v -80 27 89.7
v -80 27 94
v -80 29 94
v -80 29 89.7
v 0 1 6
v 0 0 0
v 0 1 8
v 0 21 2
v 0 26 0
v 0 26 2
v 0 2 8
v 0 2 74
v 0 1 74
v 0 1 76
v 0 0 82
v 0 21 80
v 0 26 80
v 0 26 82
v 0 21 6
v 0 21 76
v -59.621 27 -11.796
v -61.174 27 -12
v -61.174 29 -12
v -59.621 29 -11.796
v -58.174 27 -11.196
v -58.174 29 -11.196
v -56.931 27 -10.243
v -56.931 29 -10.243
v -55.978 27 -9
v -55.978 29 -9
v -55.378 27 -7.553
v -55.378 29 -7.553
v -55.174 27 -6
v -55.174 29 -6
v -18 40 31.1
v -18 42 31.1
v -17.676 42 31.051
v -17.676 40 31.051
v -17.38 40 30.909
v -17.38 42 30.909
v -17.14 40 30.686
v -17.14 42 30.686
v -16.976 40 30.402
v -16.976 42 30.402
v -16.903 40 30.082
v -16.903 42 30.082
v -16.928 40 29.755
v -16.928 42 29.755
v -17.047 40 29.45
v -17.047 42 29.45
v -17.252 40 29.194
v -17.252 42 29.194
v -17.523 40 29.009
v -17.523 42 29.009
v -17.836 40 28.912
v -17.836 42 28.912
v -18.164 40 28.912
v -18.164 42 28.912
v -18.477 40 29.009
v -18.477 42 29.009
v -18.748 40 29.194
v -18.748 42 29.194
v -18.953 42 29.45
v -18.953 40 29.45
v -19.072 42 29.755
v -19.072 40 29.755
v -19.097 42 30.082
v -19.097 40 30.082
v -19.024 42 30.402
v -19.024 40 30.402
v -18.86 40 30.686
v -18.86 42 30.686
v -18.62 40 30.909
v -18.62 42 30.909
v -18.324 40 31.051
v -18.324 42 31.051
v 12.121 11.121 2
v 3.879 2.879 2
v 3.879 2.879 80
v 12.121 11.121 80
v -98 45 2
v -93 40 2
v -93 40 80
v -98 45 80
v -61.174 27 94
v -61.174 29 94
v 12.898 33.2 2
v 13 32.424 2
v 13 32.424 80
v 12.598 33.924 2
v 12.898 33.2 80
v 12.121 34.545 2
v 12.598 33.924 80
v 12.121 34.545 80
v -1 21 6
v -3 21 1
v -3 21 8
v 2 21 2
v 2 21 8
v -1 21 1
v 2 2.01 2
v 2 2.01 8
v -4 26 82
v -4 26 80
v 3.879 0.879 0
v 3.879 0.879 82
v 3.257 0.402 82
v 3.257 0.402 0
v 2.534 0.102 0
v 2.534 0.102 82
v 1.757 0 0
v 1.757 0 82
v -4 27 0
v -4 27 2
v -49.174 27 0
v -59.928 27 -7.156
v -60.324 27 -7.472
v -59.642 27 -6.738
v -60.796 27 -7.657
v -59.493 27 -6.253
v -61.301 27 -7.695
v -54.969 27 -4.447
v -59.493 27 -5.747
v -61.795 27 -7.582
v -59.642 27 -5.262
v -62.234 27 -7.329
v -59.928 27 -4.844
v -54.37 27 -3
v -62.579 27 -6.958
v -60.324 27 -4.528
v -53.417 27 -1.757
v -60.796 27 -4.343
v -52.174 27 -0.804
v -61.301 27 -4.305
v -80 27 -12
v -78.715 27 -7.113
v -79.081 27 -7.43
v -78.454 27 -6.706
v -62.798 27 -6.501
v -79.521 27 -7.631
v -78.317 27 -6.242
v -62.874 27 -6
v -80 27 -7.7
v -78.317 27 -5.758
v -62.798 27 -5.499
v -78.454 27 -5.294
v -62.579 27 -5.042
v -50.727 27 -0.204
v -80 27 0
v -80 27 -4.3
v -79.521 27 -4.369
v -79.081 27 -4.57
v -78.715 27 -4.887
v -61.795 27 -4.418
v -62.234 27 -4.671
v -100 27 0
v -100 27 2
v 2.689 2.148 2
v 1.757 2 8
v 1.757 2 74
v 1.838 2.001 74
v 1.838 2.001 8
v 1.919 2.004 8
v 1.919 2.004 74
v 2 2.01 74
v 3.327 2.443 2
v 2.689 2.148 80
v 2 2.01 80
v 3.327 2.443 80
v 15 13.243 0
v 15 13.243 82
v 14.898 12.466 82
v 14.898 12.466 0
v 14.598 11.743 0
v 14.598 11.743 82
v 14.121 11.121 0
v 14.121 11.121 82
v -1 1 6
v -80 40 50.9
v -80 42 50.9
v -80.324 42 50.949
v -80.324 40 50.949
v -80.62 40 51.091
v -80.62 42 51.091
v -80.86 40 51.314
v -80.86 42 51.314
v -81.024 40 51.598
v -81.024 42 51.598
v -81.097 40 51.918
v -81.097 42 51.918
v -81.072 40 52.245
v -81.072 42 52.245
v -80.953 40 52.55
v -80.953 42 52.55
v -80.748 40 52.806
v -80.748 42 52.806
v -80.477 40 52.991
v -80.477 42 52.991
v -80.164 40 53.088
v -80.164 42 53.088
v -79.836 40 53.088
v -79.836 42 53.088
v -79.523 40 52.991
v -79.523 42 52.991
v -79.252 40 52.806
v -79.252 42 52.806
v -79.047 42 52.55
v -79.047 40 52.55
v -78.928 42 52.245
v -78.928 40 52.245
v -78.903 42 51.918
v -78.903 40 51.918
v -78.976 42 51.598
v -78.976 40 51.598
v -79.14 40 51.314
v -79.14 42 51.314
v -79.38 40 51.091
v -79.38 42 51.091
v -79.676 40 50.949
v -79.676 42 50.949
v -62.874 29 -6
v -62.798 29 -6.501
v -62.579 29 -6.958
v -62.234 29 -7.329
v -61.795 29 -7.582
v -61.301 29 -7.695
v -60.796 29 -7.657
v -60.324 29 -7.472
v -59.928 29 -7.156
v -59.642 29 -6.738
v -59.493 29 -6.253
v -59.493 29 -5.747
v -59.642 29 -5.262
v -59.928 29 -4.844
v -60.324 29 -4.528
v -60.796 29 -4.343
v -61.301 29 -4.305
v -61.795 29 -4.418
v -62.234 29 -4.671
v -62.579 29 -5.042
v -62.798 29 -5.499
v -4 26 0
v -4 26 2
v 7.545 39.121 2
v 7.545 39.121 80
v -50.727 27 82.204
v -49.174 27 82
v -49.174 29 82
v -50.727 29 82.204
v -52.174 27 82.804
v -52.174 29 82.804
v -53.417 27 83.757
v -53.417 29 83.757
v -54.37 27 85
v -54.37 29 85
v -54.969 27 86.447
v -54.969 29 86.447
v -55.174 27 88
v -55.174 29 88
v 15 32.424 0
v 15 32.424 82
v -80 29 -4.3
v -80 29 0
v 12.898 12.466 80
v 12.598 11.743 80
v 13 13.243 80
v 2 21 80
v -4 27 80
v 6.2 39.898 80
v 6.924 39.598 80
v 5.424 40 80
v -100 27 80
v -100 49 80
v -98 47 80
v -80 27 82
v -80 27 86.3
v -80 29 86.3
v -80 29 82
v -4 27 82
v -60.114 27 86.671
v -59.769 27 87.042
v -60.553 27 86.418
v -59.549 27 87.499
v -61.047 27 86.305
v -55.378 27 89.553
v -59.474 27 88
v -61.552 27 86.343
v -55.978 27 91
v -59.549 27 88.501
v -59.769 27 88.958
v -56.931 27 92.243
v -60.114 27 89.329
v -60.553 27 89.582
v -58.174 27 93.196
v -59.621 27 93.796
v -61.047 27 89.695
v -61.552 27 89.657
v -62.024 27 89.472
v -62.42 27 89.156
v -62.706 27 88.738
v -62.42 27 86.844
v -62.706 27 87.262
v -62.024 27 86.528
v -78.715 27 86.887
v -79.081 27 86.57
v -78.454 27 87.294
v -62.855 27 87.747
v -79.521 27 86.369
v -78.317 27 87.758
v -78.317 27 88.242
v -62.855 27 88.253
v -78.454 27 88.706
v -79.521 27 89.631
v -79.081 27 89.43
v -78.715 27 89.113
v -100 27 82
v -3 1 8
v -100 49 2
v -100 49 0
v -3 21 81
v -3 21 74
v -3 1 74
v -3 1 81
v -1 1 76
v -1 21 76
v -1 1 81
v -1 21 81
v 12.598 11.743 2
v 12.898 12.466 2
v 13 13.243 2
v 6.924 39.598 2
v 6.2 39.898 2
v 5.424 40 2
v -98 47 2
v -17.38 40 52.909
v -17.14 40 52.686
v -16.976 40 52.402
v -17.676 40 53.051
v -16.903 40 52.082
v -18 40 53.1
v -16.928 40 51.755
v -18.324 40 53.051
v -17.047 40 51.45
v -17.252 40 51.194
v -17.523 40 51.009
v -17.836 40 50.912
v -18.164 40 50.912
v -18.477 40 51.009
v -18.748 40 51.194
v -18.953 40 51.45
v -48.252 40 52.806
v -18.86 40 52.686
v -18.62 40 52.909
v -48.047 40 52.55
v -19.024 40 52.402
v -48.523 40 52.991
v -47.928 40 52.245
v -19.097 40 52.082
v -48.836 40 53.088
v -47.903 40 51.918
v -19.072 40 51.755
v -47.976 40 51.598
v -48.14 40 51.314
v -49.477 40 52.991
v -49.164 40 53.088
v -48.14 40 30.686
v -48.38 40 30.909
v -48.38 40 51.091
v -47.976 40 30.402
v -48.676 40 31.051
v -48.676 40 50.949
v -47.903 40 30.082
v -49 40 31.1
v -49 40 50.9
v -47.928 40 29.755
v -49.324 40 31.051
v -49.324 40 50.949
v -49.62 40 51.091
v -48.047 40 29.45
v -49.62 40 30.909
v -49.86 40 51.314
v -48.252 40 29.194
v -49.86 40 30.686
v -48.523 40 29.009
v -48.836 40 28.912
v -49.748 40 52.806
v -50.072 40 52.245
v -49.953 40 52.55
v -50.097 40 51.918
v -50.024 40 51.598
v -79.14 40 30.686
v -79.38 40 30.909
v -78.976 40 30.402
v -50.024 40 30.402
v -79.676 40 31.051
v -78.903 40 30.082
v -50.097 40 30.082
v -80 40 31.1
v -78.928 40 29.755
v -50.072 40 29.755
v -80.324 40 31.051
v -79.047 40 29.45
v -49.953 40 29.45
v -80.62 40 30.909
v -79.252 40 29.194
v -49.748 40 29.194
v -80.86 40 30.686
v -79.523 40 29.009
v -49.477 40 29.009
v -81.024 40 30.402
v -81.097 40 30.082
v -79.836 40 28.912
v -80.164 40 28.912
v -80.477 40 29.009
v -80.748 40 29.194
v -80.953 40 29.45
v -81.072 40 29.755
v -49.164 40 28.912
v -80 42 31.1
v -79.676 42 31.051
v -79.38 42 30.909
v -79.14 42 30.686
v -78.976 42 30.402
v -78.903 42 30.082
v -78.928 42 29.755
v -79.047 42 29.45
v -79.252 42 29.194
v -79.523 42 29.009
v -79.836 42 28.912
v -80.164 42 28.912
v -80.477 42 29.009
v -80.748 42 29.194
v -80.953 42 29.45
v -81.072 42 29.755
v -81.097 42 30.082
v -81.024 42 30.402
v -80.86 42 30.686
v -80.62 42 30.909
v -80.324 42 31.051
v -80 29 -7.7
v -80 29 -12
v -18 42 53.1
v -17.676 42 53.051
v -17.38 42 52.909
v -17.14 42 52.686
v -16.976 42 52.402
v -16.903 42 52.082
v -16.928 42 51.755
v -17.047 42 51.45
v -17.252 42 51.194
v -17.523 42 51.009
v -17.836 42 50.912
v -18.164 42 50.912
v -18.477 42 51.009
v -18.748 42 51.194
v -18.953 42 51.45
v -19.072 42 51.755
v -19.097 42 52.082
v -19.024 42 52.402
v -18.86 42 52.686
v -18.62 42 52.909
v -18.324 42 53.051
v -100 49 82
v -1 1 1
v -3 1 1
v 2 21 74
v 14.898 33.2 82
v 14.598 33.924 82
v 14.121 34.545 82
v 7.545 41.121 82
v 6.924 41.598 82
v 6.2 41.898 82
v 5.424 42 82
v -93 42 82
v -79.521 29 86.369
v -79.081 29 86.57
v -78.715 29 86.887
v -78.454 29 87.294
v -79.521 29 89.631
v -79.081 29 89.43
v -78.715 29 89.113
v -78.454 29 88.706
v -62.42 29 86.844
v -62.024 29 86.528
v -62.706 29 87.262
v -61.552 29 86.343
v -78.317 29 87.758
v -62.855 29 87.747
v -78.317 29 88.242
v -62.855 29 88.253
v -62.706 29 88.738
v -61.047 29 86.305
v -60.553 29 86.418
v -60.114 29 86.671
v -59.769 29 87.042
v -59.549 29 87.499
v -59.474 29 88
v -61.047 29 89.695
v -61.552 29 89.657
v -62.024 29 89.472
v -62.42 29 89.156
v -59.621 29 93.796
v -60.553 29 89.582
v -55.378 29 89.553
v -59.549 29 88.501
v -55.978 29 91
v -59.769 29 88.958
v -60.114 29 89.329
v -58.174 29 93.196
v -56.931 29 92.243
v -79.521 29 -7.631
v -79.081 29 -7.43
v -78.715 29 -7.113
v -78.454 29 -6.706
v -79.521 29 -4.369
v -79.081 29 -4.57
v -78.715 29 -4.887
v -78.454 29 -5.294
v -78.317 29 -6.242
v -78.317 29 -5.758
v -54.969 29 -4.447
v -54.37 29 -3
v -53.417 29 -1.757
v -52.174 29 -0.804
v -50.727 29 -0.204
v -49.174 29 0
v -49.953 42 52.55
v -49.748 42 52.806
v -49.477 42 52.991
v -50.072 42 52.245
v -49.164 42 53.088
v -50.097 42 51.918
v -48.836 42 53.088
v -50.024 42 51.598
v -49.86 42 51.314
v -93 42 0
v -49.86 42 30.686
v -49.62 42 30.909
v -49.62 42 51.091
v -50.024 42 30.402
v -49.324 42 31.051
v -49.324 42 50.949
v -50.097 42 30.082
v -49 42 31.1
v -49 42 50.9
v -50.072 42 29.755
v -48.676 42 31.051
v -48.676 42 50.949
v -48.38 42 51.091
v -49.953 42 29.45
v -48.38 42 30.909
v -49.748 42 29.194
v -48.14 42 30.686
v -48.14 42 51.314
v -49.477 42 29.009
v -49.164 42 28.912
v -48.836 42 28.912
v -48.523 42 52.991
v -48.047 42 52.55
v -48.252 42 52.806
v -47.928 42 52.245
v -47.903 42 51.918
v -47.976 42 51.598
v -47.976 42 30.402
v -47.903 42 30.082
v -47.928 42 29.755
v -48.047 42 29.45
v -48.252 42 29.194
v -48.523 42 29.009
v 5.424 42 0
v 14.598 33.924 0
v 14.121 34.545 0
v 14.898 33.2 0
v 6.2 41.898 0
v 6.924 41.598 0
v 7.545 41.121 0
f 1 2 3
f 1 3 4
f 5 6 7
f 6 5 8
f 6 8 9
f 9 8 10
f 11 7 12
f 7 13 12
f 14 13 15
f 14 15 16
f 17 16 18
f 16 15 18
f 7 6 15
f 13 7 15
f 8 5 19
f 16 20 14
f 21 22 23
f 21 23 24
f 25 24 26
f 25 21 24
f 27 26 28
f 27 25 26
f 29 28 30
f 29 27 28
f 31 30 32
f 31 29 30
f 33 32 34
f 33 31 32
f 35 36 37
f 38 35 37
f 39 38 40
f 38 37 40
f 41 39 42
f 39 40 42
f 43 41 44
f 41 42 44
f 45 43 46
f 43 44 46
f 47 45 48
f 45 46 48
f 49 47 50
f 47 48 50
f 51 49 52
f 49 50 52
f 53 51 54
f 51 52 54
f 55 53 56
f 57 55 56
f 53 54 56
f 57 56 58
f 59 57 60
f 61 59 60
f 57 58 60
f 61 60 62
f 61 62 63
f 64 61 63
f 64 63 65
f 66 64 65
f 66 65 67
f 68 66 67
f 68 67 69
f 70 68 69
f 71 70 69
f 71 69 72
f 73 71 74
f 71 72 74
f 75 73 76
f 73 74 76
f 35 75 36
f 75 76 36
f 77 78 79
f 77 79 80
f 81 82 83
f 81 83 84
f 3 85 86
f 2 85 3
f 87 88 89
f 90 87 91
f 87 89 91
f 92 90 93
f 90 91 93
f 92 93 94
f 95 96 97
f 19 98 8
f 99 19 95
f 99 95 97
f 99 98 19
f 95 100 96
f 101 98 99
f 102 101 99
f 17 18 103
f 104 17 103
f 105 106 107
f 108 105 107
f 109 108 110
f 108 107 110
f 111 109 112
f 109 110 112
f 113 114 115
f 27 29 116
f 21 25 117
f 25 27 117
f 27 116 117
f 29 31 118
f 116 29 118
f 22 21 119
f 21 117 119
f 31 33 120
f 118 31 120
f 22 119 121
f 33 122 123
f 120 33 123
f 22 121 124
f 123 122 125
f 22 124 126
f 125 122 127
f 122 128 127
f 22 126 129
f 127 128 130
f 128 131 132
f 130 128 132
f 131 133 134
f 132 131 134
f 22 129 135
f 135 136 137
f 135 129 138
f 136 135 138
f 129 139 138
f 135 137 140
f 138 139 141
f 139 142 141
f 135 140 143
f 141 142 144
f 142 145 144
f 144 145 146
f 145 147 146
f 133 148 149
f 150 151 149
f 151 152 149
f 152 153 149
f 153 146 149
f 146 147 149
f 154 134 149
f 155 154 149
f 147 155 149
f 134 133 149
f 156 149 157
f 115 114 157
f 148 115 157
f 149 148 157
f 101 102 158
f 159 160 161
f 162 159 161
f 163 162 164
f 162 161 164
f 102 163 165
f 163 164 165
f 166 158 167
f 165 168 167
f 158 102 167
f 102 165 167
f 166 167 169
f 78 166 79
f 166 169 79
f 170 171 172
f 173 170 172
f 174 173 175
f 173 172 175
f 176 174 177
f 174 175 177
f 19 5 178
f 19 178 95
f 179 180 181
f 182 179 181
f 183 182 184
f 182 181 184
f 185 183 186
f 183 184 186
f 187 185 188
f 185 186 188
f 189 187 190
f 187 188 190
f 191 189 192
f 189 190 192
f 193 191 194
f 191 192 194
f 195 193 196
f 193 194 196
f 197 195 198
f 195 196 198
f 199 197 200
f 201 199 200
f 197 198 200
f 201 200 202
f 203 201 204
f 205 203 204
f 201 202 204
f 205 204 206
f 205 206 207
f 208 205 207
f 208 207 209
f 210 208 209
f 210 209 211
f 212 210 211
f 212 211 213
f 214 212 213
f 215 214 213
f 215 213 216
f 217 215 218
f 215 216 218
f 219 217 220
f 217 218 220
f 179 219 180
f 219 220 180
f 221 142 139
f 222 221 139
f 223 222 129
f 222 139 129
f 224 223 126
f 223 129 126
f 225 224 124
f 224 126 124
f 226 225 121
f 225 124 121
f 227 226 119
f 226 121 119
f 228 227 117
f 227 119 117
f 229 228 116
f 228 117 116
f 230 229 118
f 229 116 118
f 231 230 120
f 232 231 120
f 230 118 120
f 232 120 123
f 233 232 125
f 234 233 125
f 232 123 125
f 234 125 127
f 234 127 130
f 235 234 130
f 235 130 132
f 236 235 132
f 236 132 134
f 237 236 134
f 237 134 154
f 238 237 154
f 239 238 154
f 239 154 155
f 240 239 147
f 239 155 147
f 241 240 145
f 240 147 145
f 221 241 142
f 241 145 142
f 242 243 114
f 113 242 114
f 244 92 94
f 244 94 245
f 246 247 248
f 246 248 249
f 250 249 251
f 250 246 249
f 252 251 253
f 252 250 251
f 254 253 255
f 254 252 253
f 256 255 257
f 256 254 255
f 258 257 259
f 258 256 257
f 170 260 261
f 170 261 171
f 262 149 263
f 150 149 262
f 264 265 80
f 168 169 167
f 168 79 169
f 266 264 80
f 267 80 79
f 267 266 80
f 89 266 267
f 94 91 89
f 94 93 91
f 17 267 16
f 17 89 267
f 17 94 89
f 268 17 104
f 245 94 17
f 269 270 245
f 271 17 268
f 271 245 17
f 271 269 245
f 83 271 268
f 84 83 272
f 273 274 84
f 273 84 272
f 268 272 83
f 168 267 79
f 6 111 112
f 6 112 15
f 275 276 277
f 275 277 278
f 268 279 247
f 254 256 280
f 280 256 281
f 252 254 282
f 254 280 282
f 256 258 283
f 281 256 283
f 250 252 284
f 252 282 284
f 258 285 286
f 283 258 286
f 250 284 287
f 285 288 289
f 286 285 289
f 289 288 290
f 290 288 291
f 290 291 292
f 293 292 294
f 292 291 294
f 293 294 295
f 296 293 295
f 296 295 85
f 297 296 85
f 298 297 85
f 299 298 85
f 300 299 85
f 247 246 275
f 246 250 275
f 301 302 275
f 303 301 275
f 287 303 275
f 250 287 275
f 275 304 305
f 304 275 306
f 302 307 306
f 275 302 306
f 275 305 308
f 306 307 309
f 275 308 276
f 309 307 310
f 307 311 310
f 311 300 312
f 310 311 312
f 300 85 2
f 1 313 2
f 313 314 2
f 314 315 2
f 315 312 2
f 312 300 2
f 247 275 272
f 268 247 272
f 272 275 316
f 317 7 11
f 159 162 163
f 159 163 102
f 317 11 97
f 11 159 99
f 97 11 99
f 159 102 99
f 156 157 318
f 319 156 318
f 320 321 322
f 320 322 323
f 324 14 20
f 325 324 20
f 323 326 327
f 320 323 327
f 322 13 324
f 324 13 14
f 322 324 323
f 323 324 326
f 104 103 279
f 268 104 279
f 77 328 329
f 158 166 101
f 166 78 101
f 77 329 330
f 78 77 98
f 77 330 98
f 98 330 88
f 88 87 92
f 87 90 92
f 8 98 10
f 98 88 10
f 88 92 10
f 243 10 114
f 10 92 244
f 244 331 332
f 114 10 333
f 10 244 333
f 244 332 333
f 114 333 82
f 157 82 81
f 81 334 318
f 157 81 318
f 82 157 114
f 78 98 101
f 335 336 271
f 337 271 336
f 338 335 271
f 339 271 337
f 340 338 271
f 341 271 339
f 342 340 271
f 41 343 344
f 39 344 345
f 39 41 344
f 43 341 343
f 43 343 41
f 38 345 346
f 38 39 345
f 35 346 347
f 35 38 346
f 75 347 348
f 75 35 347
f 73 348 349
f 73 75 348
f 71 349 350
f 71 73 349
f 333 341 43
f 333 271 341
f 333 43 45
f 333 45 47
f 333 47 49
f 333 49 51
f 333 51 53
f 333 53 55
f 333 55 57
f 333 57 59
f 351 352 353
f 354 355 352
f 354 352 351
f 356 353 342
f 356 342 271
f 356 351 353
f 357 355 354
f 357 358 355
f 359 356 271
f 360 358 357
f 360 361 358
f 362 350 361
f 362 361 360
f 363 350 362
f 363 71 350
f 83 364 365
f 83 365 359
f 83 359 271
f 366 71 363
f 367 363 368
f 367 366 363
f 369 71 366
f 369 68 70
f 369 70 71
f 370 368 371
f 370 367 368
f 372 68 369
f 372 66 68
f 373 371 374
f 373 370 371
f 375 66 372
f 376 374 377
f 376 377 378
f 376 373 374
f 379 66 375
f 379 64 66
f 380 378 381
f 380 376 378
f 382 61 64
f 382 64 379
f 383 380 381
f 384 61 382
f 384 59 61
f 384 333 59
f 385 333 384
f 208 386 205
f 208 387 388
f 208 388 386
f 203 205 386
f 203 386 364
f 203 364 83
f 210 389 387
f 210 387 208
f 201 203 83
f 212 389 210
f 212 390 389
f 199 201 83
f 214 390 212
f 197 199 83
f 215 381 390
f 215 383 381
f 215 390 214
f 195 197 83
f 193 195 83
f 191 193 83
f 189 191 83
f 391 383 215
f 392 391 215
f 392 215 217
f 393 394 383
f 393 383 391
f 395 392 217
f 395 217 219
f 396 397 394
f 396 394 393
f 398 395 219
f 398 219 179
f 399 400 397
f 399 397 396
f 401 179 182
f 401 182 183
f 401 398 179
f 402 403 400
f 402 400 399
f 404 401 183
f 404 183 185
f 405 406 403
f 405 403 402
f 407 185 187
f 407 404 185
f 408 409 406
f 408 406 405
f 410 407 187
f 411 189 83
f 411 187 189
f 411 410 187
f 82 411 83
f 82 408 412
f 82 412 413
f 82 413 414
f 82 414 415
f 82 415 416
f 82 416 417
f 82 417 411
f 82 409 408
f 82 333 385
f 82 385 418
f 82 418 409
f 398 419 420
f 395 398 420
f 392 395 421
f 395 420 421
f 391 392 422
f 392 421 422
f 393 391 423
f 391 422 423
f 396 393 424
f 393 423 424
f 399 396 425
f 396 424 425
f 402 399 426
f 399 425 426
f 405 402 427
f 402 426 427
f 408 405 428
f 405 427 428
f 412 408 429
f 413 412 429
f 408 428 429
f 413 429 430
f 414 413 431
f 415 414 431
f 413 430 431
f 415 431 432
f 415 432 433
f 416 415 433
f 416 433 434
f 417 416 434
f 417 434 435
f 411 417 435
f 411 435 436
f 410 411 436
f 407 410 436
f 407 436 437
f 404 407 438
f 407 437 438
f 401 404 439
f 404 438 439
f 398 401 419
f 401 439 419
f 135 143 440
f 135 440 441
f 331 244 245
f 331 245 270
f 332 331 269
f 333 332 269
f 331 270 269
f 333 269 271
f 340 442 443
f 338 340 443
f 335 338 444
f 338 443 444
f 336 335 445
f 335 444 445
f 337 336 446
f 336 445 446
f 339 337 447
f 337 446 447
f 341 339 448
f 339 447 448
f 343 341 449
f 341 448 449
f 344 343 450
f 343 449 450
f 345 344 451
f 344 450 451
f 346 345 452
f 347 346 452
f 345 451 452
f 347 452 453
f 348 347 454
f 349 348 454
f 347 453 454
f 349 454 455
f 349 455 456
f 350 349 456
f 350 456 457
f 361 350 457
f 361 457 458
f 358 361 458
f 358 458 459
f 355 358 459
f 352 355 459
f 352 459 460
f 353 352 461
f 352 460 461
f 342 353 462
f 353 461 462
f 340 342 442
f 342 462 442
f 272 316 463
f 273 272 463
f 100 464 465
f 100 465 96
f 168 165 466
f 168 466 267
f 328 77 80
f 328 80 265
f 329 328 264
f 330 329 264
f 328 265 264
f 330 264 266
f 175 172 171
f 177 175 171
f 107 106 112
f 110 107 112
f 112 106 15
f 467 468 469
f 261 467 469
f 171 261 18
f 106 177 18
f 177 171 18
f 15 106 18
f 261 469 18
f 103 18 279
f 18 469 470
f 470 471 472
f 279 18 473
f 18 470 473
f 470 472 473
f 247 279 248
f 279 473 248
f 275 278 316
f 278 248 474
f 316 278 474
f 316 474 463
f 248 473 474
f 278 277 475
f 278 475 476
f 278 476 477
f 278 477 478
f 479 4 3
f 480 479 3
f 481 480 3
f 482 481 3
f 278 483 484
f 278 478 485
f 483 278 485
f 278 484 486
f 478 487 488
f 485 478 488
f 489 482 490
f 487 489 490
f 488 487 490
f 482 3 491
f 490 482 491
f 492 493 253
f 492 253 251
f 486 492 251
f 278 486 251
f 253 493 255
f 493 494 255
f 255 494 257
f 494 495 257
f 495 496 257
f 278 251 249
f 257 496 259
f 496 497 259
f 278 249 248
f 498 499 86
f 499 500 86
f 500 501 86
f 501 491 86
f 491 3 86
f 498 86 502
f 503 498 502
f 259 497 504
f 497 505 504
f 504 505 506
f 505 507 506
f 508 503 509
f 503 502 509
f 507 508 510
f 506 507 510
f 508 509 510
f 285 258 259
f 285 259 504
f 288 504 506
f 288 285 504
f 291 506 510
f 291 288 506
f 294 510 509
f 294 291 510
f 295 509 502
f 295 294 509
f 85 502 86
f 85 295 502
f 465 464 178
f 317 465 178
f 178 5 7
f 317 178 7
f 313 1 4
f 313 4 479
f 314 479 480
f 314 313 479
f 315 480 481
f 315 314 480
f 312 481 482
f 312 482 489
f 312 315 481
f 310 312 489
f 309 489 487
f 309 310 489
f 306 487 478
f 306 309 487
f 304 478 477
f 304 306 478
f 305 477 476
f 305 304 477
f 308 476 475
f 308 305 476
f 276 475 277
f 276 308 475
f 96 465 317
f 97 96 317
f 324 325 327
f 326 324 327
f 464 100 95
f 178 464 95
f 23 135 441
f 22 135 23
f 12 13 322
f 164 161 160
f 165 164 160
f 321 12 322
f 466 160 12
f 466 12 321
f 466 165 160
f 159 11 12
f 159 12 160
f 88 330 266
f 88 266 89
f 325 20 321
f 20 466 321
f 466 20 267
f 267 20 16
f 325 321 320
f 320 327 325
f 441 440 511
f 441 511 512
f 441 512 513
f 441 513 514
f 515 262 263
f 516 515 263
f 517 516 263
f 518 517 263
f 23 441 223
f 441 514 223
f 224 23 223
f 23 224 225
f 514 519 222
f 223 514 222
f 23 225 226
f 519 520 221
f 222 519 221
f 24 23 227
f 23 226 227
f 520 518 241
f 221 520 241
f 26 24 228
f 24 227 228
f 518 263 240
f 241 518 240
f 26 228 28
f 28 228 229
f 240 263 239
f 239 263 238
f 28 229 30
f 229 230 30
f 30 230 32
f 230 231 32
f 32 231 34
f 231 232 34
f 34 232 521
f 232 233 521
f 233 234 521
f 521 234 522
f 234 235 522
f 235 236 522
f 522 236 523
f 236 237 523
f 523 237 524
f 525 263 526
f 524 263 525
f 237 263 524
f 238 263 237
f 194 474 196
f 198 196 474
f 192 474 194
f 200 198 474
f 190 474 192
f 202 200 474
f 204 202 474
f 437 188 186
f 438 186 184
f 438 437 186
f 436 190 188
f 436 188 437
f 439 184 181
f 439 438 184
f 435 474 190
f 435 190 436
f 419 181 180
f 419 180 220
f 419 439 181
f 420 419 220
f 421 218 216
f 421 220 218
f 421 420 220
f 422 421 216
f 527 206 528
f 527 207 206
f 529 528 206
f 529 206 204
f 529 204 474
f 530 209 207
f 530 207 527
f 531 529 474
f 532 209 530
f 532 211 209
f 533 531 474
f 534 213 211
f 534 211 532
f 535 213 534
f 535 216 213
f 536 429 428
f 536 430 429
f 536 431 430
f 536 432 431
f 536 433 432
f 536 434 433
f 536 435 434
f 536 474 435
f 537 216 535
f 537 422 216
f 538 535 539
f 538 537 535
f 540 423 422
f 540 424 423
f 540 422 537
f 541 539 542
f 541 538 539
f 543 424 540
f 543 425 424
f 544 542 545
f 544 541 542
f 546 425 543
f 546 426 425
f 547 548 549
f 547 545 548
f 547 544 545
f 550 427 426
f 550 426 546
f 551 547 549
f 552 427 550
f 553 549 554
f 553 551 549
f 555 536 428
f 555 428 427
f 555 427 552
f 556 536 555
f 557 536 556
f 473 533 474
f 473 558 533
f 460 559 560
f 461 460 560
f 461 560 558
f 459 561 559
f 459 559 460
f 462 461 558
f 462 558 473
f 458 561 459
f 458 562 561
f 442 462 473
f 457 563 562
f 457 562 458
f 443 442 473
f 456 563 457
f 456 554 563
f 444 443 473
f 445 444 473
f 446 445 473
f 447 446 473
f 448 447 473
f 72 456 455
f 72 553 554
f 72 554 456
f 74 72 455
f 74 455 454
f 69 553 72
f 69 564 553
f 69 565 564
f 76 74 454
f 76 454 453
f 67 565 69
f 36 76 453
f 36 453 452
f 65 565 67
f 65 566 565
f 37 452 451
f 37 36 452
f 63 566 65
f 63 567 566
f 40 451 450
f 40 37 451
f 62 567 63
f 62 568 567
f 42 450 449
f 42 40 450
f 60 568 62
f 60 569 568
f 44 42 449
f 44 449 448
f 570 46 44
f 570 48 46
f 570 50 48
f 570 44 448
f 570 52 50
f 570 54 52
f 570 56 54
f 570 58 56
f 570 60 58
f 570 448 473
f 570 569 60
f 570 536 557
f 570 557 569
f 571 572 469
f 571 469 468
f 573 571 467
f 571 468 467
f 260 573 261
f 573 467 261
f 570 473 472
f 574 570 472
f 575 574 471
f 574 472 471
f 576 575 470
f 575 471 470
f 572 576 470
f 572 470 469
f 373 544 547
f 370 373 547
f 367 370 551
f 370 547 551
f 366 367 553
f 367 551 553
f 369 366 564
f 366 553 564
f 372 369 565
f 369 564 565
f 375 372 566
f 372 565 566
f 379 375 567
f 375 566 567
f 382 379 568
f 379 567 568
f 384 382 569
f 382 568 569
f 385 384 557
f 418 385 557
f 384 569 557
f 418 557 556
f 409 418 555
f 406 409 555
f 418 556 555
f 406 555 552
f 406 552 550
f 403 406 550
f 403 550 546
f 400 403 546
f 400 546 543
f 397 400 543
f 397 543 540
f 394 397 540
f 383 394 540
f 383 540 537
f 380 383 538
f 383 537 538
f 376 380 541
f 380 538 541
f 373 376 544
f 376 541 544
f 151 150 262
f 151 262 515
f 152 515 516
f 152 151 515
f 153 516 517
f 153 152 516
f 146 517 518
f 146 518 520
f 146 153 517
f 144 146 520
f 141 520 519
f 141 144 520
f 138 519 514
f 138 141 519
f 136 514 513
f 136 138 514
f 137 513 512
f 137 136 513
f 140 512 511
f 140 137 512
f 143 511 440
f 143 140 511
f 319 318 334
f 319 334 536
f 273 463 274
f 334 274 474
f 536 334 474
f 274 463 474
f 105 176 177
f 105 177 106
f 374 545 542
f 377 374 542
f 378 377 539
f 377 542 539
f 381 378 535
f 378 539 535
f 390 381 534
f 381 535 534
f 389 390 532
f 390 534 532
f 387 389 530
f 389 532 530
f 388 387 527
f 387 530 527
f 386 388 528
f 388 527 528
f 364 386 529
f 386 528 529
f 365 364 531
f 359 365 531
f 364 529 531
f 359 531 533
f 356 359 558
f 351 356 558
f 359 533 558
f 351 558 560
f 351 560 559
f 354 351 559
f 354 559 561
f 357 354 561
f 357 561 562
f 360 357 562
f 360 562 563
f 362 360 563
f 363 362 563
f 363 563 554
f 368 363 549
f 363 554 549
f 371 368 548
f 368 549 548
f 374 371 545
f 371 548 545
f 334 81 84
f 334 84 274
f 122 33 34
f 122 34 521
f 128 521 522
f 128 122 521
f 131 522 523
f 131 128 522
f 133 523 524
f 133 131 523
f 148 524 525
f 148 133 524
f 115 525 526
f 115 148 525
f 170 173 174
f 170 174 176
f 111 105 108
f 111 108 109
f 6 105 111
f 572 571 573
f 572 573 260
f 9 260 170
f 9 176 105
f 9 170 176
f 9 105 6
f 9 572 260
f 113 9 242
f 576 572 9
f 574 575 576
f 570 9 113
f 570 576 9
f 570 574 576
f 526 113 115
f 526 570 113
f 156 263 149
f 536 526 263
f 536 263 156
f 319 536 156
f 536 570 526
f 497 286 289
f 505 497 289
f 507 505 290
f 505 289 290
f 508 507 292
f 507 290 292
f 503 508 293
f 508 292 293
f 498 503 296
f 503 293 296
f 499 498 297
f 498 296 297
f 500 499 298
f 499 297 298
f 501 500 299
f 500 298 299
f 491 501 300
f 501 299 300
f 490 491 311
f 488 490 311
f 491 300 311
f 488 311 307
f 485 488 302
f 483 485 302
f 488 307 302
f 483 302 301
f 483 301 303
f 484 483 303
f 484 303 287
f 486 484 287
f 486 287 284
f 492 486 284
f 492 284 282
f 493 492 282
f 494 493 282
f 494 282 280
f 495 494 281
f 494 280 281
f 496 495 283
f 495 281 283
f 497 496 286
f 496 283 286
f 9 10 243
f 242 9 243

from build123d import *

# Parameters (mm, degrees)
EXTRUDE_1_DEPTH     = 82
FILLET_1_R          = 3
EXTRUDE_START       = -2
EXTRUDE_2_DEPTH     = 2
EXTRUDE_START_2     = -82
EXTRUDE_3_DEPTH     = 2
SKETCH_3_W          = 7
SKETCH_3_H          = 20
EXTRUDE_4_DEPTH     = 2
SKETCH_4_W          = 2
SKETCH_4_H          = 20
EXTRUDE_5_DEPTH     = 1
SKETCH_5_W          = 7
SKETCH_5_H          = 20
EXTRUDE_6_DEPTH     = 2
SKETCH_6_R          = 1.7
EXTRUDE_7_DEPTH     = 2
SKETCH_7_R          = 1.1
CUT_EXTRUDE_1_DEPTH = 2


with BuildPart() as part:
    # 草图1 → 凸台-拉伸1 (new body)
    with BuildSketch(Plane.XY):
        Polygon((0, 2), (3, 2), (13, 12), (13, 33.666666667), (6.666666667, 40), (-93, 40), (-98, 45), (-98, 47), (-93, 42), (6.666666667, 42), (15, 33.666666667), (15, 12), (3, 0), (0, 0), align=None)
    extrude(amount=EXTRUDE_1_DEPTH)

    # 圆角1
    fillet_1_edges = [part.edges().sort_by_distance(p)[0] for p in [
        (3, 2, 41),
        (13, 12, 41),
        (13, 33.666666667, 41),
        (6.666666667, 40, 41),
        (6.666666667, 42, 41),
        (15, 33.666666667, 41),
        (15, 12, 41),
        (3, 0, 41),
    ]]
    fillet(fillet_1_edges, radius=FILLET_1_R)

    # 草图2 → 凸台-拉伸2 (add)
    with BuildSketch(Plane(origin=(0, 0, 0), x_dir=(-1, 0, 0), z_dir=(0, 0, -1)).offset(EXTRUDE_START)):
        with BuildLine():
            Line((100, 27), (100, 49))
            Line((100, 49), (93, 42))
            Line((93, 42), (-5.42402598, 42))
            ThreePointArc((-5.42402598, 42), (-6.572076277, 41.771638598), (-7.545346323, 41.121320344))
            Line((-7.545346323, 41.121320344), (-14.121320344, 34.545346323))
            ThreePointArc((-14.121320344, 34.545346323), (-14.771638598, 33.572076277), (-15, 32.42402598))
            Line((-15, 32.42402598), (-15, 13.242640687))
            ThreePointArc((-15, 13.242640687), (-14.771638598, 12.09459039), (-14.121320344, 11.121320344))
            Line((-14.121320344, 11.121320344), (-3.878679656, 0.878679656))
            ThreePointArc((-3.878679656, 0.878679656), (-2.90540961, 0.228361402), (-1.757359313, 0))
            Line((-1.757359313, 0), (0, 0))
            Line((0, 0), (0, 26))
            Line((0, 26), (4, 26))
            Line((4, 26), (4, 27))
            Line((4, 27), (100, 27))
        make_face()
    extrude(amount=EXTRUDE_2_DEPTH)

    # 草图2<2> → 凸台-拉伸3 (add)
    with BuildSketch(Plane(origin=(0, 0, 0), x_dir=(-1, 0, 0), z_dir=(0, 0, -1)).offset(EXTRUDE_START_2)):
        with BuildLine():
            Line((100, 27), (100, 49))
            Line((100, 49), (93, 42))
            Line((93, 42), (-5.42402598, 42))
            ThreePointArc((-5.42402598, 42), (-6.572076277, 41.771638598), (-7.545346323, 41.121320344))
            Line((-7.545346323, 41.121320344), (-14.121320344, 34.545346323))
            ThreePointArc((-14.121320344, 34.545346323), (-14.771638598, 33.572076277), (-15, 32.42402598))
            Line((-15, 32.42402598), (-15, 13.242640687))
            ThreePointArc((-15, 13.242640687), (-14.771638598, 12.09459039), (-14.121320344, 11.121320344))
            Line((-14.121320344, 11.121320344), (-3.878679656, 0.878679656))
            ThreePointArc((-3.878679656, 0.878679656), (-2.90540961, 0.228361402), (-1.757359313, 0))
            Line((-1.757359313, 0), (0, 0))
            Line((0, 0), (0, 26))
            Line((0, 26), (4, 26))
            Line((4, 26), (4, 27))
            Line((4, 27), (100, 27))
        make_face()
    extrude(amount=EXTRUDE_3_DEPTH)

    # 草图3 → 凸台-拉伸4 (add)
    with BuildSketch(Plane.ZY):
        with Locations((4.5, 11)):
            Rectangle(SKETCH_3_W, SKETCH_3_H)
        with Locations((77.5, 11)):
            Rectangle(SKETCH_3_W, SKETCH_3_H)
    extrude(amount=-EXTRUDE_4_DEPTH)

    # 草图4 → 凸台-拉伸5 (add)
    with BuildSketch(Plane.ZY):
        with Locations((7, 11)):
            Rectangle(SKETCH_4_W, SKETCH_4_H)
        with Locations((75, 11)):
            Rectangle(SKETCH_4_W, SKETCH_4_H)
    extrude(amount=EXTRUDE_5_DEPTH)

    # 草图5 → 凸台-拉伸6 (add)
    with BuildSketch(Plane.ZY.offset(1)):
        with Locations((4.5, 11)):
            Rectangle(SKETCH_5_W, SKETCH_5_H)
        with Locations((77.5, 11)):
            Rectangle(SKETCH_5_W, SKETCH_5_H)
    extrude(amount=EXTRUDE_6_DEPTH)

    # 草图6 → 凸台-拉伸7 (add)
    # profile 1 of 2: a face of its own
    with BuildSketch(Plane.XZ.offset(-27)):
        with BuildLine():
            Line((-80, 86.3), (-80, 82))
            Line((-80, 82), (-49.173938425, 82))
            ThreePointArc((-49.173938425, 82), (-53.416579112, 83.757359313), (-55.173938425, 88))
            ThreePointArc((-55.173938425, 88), (-56.931297738, 92.242640687), (-61.173938425, 94))
            Line((-61.173938425, 94), (-80, 94))
            Line((-80, 94), (-80, 89.7))
            ThreePointArc((-80, 89.7), (-78.3, 88), (-80, 86.3))
        make_face()
        with Locations((-61.173938425, 88)):
            Circle(SKETCH_6_R, mode=Mode.SUBTRACT)
    # profile 2 of 2: a face of its own
    with BuildSketch(Plane.XZ.offset(-27)):
        with BuildLine():
            Line((-80, -12), (-61.173938425, -12))
            ThreePointArc((-61.173938425, -12), (-56.931297738, -10.242640687), (-55.173938425, -6))
            ThreePointArc((-55.173938425, -6), (-53.416579112, -1.757359313), (-49.173938425, 0))
            Line((-49.173938425, 0), (-80, 0))
            Line((-80, 0), (-80, -4.3))
            ThreePointArc((-80, -4.3), (-78.3, -6), (-80, -7.7))
            Line((-80, -7.7), (-80, -12))
        make_face()
        with Locations(Location((-61.173938425, -6, 0), (0, 0, 180))):
            Circle(SKETCH_6_R, mode=Mode.SUBTRACT)
    extrude(amount=-EXTRUDE_7_DEPTH)

    # 草图7 → 切除-拉伸1 (cut)
    with BuildSketch(Plane(origin=(0, 42, 0), x_dir=(1, 0, 0), z_dir=(0, 1, 0))):
        with Locations(Location((-49, -30, 0), (0, 0, 270))):
            Circle(SKETCH_7_R)
        with Locations(Location((-80, -30, 0), (0, 0, 270))):
            Circle(SKETCH_7_R)
        with Locations(Location((-80, -52, 0), (0, 0, 90))):
            Circle(SKETCH_7_R)
        with Locations(Location((-49, -52, 0), (0, 0, 90))):
            Circle(SKETCH_7_R)
        with Locations(Location((-18, -30, 0), (0, 0, 270))):
            Circle(SKETCH_7_R)
        with Locations(Location((-18, -52, 0), (0, 0, 270))):
            Circle(SKETCH_7_R)
    extrude(amount=-CUT_EXTRUDE_1_DEPTH, mode=Mode.SUBTRACT)


solid = part.part
